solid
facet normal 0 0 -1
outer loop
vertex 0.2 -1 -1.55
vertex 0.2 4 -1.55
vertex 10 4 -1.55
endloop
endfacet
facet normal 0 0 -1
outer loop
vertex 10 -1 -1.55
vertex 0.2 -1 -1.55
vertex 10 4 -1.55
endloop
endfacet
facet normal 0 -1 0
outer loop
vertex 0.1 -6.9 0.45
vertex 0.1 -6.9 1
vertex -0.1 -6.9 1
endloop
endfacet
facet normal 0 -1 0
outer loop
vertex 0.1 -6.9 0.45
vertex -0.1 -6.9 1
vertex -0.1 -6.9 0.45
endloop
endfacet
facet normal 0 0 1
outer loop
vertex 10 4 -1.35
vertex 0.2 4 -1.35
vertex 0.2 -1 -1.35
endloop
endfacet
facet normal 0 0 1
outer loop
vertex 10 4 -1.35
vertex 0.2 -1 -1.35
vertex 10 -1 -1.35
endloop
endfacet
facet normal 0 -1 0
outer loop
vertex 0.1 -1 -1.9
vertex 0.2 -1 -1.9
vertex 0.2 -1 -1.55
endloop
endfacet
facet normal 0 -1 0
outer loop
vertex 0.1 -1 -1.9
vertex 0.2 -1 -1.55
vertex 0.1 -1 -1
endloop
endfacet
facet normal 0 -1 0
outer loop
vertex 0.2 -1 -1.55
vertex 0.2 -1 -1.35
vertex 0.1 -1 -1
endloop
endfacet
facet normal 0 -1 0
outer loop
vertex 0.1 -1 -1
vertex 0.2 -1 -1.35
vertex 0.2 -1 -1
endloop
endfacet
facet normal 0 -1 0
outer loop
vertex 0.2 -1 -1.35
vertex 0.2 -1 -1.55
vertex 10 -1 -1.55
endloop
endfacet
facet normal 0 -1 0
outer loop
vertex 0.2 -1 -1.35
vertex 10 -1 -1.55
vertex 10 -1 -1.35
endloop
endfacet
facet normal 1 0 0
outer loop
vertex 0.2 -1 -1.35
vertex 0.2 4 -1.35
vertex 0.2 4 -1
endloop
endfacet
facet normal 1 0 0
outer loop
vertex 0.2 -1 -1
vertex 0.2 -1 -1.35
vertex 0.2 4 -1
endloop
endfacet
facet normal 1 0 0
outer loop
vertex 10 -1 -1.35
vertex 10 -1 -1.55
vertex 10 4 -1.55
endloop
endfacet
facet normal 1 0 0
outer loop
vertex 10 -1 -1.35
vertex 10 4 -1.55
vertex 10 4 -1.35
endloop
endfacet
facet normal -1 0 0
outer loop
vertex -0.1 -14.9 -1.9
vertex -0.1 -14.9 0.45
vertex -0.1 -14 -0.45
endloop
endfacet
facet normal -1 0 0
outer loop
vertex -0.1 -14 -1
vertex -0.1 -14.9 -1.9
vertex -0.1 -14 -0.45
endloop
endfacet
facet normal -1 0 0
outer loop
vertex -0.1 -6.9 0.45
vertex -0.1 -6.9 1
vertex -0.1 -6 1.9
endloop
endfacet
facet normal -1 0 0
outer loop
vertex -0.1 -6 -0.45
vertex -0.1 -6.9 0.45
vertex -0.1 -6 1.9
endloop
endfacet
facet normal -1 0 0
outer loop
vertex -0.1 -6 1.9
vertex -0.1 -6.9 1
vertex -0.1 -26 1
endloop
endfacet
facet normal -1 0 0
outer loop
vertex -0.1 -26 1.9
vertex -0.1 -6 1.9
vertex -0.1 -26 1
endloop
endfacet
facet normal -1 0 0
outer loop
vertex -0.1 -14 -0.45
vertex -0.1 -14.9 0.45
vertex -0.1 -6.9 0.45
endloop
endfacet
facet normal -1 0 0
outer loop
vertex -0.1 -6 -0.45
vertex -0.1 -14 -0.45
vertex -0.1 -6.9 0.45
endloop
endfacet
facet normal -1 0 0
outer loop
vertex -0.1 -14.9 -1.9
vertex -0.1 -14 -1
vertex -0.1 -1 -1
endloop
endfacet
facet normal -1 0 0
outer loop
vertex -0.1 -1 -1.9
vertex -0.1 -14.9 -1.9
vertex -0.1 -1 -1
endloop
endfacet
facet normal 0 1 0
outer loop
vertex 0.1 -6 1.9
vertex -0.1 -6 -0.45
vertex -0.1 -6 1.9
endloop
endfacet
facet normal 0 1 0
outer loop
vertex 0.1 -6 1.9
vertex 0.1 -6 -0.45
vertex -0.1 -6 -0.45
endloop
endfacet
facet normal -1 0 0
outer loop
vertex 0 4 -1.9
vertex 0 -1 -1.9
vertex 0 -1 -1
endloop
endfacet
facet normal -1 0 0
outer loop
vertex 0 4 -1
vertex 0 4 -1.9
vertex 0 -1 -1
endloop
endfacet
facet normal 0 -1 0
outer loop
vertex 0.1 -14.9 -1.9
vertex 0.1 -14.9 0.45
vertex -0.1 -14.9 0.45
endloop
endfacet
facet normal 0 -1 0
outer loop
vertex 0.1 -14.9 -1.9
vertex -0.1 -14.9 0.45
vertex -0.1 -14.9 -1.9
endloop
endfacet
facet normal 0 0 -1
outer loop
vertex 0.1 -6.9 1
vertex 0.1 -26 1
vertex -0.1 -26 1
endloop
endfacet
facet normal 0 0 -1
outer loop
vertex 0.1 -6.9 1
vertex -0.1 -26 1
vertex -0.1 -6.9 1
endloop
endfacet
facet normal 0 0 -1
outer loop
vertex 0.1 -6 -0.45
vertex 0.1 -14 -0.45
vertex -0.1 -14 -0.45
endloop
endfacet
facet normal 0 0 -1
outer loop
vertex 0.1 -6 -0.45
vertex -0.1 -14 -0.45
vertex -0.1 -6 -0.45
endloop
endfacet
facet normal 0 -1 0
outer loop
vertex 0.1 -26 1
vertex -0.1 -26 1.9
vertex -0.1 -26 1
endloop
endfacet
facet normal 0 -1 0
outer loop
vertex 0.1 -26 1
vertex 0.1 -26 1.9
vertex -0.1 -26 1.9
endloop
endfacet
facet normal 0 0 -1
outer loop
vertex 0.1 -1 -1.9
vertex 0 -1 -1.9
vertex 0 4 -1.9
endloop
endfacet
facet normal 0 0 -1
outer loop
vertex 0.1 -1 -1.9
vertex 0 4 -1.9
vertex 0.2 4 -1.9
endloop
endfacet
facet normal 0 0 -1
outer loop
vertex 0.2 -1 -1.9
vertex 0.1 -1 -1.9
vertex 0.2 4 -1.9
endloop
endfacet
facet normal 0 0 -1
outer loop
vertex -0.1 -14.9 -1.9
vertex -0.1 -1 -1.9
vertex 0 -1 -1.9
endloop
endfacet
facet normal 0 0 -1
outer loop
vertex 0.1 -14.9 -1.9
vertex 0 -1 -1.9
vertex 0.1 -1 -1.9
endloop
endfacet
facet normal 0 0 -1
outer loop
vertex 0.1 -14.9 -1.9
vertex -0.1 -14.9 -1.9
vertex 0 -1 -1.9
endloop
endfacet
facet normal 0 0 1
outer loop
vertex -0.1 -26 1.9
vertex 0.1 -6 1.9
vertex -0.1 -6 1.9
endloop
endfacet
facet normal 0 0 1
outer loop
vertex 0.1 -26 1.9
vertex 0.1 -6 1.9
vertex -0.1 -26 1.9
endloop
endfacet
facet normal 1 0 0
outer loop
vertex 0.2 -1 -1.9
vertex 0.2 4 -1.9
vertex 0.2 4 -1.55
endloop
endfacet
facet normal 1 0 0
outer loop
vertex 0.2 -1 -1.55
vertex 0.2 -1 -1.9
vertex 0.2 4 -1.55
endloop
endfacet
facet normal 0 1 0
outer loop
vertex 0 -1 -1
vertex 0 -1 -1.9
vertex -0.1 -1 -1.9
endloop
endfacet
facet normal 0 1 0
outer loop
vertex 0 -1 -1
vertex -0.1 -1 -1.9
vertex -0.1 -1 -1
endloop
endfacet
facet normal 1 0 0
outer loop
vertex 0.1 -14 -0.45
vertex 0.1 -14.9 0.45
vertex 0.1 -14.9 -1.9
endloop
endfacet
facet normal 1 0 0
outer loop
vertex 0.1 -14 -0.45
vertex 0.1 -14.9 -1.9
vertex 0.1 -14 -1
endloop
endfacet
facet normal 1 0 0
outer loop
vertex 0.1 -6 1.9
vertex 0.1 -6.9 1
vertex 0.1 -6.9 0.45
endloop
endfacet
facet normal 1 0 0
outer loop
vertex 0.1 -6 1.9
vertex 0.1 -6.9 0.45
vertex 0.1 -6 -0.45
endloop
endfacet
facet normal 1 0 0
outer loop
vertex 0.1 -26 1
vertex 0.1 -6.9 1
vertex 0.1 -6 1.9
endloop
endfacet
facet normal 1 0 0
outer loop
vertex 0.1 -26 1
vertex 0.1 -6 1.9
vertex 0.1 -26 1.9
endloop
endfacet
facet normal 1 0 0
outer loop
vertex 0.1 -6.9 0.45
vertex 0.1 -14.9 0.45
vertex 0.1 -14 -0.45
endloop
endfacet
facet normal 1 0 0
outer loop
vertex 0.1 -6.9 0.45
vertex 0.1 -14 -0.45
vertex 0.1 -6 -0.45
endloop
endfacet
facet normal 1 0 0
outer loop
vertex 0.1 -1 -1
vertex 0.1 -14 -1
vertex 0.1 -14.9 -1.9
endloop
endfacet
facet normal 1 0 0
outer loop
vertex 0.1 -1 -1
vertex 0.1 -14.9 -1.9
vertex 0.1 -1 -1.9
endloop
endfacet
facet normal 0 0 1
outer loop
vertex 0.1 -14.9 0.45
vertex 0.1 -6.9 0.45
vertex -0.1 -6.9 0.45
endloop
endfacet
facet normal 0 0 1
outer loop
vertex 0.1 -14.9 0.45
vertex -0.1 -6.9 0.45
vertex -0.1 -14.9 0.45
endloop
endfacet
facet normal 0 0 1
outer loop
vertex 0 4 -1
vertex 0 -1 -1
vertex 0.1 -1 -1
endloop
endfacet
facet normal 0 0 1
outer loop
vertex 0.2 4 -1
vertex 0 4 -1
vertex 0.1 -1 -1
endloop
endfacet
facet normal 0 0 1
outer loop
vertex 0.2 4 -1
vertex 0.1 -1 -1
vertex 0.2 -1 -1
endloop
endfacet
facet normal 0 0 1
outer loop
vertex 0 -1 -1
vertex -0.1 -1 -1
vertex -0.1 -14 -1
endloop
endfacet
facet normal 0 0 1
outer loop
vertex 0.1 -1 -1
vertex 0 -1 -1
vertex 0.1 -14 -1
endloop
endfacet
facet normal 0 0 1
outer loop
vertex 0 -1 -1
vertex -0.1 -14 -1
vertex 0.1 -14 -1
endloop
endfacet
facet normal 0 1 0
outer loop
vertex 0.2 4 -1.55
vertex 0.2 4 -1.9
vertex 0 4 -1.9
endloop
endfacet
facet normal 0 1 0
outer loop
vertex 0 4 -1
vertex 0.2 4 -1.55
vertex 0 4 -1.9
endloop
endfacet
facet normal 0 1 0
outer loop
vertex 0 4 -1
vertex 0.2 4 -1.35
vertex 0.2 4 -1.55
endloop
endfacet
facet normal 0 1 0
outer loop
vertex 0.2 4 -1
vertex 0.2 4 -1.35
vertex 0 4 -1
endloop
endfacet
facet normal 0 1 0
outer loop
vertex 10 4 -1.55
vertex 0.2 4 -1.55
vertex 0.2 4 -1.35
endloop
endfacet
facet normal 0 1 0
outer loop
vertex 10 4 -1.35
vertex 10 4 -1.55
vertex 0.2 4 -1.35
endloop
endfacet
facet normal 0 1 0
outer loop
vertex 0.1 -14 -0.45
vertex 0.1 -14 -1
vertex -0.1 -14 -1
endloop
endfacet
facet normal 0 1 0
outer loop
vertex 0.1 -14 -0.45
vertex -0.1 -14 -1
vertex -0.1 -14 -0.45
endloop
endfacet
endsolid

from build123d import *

# Parameters (mm, degrees)
PAD015_DEPTH  = 0.1
SKETCH_W      = 0.9
SKETCH_H      = 10
PAD_DEPTH     = 5
SKETCH024_W   = 0.693804
SKETCH024_H   = 10.010304
SKETCH024_W_2 = 0.997342
SKETCH024_H_2 = 10.046701
POCKET_DEPTH  = 5


with BuildPart() as part:
    # Sketch023 → Pad015 (new body, symmetric)
    with BuildSketch(Plane.YZ):
        Polygon((-26, 1.9), (-26, 1), (-6.9, 1), (-6.9, 0.45), (-14.9, 0.45), (-14.9, -1.9), (-1, -1.9), (-1, -1), (-14, -1), (-14, -0.45), (-6, -0.45), (-6, 1.9), align=None)
    extrude(amount=PAD015_DEPTH, both=True)

    # Sketch (on Face7 of Pad015) → Pad (join)
    with BuildSketch(Plane.ZX.offset(-1)):
        with Locations((-1.45, 5)):
            Rectangle(SKETCH_W, SKETCH_H)
    extrude(amount=PAD_DEPTH)

    # Sketch024 (on Face20 of Pad) → Pocket (cut)
    with BuildSketch(Plane.ZX.offset(4)):
        with Locations((-1.003098, 5.205152)):
            Rectangle(SKETCH024_W, SKETCH024_H)
        with Locations((-2.048671, 5.22335)):
            Rectangle(SKETCH024_W_2, SKETCH024_H_2)
    extrude(amount=-POCKET_DEPTH, mode=Mode.SUBTRACT)


solid = part.part
